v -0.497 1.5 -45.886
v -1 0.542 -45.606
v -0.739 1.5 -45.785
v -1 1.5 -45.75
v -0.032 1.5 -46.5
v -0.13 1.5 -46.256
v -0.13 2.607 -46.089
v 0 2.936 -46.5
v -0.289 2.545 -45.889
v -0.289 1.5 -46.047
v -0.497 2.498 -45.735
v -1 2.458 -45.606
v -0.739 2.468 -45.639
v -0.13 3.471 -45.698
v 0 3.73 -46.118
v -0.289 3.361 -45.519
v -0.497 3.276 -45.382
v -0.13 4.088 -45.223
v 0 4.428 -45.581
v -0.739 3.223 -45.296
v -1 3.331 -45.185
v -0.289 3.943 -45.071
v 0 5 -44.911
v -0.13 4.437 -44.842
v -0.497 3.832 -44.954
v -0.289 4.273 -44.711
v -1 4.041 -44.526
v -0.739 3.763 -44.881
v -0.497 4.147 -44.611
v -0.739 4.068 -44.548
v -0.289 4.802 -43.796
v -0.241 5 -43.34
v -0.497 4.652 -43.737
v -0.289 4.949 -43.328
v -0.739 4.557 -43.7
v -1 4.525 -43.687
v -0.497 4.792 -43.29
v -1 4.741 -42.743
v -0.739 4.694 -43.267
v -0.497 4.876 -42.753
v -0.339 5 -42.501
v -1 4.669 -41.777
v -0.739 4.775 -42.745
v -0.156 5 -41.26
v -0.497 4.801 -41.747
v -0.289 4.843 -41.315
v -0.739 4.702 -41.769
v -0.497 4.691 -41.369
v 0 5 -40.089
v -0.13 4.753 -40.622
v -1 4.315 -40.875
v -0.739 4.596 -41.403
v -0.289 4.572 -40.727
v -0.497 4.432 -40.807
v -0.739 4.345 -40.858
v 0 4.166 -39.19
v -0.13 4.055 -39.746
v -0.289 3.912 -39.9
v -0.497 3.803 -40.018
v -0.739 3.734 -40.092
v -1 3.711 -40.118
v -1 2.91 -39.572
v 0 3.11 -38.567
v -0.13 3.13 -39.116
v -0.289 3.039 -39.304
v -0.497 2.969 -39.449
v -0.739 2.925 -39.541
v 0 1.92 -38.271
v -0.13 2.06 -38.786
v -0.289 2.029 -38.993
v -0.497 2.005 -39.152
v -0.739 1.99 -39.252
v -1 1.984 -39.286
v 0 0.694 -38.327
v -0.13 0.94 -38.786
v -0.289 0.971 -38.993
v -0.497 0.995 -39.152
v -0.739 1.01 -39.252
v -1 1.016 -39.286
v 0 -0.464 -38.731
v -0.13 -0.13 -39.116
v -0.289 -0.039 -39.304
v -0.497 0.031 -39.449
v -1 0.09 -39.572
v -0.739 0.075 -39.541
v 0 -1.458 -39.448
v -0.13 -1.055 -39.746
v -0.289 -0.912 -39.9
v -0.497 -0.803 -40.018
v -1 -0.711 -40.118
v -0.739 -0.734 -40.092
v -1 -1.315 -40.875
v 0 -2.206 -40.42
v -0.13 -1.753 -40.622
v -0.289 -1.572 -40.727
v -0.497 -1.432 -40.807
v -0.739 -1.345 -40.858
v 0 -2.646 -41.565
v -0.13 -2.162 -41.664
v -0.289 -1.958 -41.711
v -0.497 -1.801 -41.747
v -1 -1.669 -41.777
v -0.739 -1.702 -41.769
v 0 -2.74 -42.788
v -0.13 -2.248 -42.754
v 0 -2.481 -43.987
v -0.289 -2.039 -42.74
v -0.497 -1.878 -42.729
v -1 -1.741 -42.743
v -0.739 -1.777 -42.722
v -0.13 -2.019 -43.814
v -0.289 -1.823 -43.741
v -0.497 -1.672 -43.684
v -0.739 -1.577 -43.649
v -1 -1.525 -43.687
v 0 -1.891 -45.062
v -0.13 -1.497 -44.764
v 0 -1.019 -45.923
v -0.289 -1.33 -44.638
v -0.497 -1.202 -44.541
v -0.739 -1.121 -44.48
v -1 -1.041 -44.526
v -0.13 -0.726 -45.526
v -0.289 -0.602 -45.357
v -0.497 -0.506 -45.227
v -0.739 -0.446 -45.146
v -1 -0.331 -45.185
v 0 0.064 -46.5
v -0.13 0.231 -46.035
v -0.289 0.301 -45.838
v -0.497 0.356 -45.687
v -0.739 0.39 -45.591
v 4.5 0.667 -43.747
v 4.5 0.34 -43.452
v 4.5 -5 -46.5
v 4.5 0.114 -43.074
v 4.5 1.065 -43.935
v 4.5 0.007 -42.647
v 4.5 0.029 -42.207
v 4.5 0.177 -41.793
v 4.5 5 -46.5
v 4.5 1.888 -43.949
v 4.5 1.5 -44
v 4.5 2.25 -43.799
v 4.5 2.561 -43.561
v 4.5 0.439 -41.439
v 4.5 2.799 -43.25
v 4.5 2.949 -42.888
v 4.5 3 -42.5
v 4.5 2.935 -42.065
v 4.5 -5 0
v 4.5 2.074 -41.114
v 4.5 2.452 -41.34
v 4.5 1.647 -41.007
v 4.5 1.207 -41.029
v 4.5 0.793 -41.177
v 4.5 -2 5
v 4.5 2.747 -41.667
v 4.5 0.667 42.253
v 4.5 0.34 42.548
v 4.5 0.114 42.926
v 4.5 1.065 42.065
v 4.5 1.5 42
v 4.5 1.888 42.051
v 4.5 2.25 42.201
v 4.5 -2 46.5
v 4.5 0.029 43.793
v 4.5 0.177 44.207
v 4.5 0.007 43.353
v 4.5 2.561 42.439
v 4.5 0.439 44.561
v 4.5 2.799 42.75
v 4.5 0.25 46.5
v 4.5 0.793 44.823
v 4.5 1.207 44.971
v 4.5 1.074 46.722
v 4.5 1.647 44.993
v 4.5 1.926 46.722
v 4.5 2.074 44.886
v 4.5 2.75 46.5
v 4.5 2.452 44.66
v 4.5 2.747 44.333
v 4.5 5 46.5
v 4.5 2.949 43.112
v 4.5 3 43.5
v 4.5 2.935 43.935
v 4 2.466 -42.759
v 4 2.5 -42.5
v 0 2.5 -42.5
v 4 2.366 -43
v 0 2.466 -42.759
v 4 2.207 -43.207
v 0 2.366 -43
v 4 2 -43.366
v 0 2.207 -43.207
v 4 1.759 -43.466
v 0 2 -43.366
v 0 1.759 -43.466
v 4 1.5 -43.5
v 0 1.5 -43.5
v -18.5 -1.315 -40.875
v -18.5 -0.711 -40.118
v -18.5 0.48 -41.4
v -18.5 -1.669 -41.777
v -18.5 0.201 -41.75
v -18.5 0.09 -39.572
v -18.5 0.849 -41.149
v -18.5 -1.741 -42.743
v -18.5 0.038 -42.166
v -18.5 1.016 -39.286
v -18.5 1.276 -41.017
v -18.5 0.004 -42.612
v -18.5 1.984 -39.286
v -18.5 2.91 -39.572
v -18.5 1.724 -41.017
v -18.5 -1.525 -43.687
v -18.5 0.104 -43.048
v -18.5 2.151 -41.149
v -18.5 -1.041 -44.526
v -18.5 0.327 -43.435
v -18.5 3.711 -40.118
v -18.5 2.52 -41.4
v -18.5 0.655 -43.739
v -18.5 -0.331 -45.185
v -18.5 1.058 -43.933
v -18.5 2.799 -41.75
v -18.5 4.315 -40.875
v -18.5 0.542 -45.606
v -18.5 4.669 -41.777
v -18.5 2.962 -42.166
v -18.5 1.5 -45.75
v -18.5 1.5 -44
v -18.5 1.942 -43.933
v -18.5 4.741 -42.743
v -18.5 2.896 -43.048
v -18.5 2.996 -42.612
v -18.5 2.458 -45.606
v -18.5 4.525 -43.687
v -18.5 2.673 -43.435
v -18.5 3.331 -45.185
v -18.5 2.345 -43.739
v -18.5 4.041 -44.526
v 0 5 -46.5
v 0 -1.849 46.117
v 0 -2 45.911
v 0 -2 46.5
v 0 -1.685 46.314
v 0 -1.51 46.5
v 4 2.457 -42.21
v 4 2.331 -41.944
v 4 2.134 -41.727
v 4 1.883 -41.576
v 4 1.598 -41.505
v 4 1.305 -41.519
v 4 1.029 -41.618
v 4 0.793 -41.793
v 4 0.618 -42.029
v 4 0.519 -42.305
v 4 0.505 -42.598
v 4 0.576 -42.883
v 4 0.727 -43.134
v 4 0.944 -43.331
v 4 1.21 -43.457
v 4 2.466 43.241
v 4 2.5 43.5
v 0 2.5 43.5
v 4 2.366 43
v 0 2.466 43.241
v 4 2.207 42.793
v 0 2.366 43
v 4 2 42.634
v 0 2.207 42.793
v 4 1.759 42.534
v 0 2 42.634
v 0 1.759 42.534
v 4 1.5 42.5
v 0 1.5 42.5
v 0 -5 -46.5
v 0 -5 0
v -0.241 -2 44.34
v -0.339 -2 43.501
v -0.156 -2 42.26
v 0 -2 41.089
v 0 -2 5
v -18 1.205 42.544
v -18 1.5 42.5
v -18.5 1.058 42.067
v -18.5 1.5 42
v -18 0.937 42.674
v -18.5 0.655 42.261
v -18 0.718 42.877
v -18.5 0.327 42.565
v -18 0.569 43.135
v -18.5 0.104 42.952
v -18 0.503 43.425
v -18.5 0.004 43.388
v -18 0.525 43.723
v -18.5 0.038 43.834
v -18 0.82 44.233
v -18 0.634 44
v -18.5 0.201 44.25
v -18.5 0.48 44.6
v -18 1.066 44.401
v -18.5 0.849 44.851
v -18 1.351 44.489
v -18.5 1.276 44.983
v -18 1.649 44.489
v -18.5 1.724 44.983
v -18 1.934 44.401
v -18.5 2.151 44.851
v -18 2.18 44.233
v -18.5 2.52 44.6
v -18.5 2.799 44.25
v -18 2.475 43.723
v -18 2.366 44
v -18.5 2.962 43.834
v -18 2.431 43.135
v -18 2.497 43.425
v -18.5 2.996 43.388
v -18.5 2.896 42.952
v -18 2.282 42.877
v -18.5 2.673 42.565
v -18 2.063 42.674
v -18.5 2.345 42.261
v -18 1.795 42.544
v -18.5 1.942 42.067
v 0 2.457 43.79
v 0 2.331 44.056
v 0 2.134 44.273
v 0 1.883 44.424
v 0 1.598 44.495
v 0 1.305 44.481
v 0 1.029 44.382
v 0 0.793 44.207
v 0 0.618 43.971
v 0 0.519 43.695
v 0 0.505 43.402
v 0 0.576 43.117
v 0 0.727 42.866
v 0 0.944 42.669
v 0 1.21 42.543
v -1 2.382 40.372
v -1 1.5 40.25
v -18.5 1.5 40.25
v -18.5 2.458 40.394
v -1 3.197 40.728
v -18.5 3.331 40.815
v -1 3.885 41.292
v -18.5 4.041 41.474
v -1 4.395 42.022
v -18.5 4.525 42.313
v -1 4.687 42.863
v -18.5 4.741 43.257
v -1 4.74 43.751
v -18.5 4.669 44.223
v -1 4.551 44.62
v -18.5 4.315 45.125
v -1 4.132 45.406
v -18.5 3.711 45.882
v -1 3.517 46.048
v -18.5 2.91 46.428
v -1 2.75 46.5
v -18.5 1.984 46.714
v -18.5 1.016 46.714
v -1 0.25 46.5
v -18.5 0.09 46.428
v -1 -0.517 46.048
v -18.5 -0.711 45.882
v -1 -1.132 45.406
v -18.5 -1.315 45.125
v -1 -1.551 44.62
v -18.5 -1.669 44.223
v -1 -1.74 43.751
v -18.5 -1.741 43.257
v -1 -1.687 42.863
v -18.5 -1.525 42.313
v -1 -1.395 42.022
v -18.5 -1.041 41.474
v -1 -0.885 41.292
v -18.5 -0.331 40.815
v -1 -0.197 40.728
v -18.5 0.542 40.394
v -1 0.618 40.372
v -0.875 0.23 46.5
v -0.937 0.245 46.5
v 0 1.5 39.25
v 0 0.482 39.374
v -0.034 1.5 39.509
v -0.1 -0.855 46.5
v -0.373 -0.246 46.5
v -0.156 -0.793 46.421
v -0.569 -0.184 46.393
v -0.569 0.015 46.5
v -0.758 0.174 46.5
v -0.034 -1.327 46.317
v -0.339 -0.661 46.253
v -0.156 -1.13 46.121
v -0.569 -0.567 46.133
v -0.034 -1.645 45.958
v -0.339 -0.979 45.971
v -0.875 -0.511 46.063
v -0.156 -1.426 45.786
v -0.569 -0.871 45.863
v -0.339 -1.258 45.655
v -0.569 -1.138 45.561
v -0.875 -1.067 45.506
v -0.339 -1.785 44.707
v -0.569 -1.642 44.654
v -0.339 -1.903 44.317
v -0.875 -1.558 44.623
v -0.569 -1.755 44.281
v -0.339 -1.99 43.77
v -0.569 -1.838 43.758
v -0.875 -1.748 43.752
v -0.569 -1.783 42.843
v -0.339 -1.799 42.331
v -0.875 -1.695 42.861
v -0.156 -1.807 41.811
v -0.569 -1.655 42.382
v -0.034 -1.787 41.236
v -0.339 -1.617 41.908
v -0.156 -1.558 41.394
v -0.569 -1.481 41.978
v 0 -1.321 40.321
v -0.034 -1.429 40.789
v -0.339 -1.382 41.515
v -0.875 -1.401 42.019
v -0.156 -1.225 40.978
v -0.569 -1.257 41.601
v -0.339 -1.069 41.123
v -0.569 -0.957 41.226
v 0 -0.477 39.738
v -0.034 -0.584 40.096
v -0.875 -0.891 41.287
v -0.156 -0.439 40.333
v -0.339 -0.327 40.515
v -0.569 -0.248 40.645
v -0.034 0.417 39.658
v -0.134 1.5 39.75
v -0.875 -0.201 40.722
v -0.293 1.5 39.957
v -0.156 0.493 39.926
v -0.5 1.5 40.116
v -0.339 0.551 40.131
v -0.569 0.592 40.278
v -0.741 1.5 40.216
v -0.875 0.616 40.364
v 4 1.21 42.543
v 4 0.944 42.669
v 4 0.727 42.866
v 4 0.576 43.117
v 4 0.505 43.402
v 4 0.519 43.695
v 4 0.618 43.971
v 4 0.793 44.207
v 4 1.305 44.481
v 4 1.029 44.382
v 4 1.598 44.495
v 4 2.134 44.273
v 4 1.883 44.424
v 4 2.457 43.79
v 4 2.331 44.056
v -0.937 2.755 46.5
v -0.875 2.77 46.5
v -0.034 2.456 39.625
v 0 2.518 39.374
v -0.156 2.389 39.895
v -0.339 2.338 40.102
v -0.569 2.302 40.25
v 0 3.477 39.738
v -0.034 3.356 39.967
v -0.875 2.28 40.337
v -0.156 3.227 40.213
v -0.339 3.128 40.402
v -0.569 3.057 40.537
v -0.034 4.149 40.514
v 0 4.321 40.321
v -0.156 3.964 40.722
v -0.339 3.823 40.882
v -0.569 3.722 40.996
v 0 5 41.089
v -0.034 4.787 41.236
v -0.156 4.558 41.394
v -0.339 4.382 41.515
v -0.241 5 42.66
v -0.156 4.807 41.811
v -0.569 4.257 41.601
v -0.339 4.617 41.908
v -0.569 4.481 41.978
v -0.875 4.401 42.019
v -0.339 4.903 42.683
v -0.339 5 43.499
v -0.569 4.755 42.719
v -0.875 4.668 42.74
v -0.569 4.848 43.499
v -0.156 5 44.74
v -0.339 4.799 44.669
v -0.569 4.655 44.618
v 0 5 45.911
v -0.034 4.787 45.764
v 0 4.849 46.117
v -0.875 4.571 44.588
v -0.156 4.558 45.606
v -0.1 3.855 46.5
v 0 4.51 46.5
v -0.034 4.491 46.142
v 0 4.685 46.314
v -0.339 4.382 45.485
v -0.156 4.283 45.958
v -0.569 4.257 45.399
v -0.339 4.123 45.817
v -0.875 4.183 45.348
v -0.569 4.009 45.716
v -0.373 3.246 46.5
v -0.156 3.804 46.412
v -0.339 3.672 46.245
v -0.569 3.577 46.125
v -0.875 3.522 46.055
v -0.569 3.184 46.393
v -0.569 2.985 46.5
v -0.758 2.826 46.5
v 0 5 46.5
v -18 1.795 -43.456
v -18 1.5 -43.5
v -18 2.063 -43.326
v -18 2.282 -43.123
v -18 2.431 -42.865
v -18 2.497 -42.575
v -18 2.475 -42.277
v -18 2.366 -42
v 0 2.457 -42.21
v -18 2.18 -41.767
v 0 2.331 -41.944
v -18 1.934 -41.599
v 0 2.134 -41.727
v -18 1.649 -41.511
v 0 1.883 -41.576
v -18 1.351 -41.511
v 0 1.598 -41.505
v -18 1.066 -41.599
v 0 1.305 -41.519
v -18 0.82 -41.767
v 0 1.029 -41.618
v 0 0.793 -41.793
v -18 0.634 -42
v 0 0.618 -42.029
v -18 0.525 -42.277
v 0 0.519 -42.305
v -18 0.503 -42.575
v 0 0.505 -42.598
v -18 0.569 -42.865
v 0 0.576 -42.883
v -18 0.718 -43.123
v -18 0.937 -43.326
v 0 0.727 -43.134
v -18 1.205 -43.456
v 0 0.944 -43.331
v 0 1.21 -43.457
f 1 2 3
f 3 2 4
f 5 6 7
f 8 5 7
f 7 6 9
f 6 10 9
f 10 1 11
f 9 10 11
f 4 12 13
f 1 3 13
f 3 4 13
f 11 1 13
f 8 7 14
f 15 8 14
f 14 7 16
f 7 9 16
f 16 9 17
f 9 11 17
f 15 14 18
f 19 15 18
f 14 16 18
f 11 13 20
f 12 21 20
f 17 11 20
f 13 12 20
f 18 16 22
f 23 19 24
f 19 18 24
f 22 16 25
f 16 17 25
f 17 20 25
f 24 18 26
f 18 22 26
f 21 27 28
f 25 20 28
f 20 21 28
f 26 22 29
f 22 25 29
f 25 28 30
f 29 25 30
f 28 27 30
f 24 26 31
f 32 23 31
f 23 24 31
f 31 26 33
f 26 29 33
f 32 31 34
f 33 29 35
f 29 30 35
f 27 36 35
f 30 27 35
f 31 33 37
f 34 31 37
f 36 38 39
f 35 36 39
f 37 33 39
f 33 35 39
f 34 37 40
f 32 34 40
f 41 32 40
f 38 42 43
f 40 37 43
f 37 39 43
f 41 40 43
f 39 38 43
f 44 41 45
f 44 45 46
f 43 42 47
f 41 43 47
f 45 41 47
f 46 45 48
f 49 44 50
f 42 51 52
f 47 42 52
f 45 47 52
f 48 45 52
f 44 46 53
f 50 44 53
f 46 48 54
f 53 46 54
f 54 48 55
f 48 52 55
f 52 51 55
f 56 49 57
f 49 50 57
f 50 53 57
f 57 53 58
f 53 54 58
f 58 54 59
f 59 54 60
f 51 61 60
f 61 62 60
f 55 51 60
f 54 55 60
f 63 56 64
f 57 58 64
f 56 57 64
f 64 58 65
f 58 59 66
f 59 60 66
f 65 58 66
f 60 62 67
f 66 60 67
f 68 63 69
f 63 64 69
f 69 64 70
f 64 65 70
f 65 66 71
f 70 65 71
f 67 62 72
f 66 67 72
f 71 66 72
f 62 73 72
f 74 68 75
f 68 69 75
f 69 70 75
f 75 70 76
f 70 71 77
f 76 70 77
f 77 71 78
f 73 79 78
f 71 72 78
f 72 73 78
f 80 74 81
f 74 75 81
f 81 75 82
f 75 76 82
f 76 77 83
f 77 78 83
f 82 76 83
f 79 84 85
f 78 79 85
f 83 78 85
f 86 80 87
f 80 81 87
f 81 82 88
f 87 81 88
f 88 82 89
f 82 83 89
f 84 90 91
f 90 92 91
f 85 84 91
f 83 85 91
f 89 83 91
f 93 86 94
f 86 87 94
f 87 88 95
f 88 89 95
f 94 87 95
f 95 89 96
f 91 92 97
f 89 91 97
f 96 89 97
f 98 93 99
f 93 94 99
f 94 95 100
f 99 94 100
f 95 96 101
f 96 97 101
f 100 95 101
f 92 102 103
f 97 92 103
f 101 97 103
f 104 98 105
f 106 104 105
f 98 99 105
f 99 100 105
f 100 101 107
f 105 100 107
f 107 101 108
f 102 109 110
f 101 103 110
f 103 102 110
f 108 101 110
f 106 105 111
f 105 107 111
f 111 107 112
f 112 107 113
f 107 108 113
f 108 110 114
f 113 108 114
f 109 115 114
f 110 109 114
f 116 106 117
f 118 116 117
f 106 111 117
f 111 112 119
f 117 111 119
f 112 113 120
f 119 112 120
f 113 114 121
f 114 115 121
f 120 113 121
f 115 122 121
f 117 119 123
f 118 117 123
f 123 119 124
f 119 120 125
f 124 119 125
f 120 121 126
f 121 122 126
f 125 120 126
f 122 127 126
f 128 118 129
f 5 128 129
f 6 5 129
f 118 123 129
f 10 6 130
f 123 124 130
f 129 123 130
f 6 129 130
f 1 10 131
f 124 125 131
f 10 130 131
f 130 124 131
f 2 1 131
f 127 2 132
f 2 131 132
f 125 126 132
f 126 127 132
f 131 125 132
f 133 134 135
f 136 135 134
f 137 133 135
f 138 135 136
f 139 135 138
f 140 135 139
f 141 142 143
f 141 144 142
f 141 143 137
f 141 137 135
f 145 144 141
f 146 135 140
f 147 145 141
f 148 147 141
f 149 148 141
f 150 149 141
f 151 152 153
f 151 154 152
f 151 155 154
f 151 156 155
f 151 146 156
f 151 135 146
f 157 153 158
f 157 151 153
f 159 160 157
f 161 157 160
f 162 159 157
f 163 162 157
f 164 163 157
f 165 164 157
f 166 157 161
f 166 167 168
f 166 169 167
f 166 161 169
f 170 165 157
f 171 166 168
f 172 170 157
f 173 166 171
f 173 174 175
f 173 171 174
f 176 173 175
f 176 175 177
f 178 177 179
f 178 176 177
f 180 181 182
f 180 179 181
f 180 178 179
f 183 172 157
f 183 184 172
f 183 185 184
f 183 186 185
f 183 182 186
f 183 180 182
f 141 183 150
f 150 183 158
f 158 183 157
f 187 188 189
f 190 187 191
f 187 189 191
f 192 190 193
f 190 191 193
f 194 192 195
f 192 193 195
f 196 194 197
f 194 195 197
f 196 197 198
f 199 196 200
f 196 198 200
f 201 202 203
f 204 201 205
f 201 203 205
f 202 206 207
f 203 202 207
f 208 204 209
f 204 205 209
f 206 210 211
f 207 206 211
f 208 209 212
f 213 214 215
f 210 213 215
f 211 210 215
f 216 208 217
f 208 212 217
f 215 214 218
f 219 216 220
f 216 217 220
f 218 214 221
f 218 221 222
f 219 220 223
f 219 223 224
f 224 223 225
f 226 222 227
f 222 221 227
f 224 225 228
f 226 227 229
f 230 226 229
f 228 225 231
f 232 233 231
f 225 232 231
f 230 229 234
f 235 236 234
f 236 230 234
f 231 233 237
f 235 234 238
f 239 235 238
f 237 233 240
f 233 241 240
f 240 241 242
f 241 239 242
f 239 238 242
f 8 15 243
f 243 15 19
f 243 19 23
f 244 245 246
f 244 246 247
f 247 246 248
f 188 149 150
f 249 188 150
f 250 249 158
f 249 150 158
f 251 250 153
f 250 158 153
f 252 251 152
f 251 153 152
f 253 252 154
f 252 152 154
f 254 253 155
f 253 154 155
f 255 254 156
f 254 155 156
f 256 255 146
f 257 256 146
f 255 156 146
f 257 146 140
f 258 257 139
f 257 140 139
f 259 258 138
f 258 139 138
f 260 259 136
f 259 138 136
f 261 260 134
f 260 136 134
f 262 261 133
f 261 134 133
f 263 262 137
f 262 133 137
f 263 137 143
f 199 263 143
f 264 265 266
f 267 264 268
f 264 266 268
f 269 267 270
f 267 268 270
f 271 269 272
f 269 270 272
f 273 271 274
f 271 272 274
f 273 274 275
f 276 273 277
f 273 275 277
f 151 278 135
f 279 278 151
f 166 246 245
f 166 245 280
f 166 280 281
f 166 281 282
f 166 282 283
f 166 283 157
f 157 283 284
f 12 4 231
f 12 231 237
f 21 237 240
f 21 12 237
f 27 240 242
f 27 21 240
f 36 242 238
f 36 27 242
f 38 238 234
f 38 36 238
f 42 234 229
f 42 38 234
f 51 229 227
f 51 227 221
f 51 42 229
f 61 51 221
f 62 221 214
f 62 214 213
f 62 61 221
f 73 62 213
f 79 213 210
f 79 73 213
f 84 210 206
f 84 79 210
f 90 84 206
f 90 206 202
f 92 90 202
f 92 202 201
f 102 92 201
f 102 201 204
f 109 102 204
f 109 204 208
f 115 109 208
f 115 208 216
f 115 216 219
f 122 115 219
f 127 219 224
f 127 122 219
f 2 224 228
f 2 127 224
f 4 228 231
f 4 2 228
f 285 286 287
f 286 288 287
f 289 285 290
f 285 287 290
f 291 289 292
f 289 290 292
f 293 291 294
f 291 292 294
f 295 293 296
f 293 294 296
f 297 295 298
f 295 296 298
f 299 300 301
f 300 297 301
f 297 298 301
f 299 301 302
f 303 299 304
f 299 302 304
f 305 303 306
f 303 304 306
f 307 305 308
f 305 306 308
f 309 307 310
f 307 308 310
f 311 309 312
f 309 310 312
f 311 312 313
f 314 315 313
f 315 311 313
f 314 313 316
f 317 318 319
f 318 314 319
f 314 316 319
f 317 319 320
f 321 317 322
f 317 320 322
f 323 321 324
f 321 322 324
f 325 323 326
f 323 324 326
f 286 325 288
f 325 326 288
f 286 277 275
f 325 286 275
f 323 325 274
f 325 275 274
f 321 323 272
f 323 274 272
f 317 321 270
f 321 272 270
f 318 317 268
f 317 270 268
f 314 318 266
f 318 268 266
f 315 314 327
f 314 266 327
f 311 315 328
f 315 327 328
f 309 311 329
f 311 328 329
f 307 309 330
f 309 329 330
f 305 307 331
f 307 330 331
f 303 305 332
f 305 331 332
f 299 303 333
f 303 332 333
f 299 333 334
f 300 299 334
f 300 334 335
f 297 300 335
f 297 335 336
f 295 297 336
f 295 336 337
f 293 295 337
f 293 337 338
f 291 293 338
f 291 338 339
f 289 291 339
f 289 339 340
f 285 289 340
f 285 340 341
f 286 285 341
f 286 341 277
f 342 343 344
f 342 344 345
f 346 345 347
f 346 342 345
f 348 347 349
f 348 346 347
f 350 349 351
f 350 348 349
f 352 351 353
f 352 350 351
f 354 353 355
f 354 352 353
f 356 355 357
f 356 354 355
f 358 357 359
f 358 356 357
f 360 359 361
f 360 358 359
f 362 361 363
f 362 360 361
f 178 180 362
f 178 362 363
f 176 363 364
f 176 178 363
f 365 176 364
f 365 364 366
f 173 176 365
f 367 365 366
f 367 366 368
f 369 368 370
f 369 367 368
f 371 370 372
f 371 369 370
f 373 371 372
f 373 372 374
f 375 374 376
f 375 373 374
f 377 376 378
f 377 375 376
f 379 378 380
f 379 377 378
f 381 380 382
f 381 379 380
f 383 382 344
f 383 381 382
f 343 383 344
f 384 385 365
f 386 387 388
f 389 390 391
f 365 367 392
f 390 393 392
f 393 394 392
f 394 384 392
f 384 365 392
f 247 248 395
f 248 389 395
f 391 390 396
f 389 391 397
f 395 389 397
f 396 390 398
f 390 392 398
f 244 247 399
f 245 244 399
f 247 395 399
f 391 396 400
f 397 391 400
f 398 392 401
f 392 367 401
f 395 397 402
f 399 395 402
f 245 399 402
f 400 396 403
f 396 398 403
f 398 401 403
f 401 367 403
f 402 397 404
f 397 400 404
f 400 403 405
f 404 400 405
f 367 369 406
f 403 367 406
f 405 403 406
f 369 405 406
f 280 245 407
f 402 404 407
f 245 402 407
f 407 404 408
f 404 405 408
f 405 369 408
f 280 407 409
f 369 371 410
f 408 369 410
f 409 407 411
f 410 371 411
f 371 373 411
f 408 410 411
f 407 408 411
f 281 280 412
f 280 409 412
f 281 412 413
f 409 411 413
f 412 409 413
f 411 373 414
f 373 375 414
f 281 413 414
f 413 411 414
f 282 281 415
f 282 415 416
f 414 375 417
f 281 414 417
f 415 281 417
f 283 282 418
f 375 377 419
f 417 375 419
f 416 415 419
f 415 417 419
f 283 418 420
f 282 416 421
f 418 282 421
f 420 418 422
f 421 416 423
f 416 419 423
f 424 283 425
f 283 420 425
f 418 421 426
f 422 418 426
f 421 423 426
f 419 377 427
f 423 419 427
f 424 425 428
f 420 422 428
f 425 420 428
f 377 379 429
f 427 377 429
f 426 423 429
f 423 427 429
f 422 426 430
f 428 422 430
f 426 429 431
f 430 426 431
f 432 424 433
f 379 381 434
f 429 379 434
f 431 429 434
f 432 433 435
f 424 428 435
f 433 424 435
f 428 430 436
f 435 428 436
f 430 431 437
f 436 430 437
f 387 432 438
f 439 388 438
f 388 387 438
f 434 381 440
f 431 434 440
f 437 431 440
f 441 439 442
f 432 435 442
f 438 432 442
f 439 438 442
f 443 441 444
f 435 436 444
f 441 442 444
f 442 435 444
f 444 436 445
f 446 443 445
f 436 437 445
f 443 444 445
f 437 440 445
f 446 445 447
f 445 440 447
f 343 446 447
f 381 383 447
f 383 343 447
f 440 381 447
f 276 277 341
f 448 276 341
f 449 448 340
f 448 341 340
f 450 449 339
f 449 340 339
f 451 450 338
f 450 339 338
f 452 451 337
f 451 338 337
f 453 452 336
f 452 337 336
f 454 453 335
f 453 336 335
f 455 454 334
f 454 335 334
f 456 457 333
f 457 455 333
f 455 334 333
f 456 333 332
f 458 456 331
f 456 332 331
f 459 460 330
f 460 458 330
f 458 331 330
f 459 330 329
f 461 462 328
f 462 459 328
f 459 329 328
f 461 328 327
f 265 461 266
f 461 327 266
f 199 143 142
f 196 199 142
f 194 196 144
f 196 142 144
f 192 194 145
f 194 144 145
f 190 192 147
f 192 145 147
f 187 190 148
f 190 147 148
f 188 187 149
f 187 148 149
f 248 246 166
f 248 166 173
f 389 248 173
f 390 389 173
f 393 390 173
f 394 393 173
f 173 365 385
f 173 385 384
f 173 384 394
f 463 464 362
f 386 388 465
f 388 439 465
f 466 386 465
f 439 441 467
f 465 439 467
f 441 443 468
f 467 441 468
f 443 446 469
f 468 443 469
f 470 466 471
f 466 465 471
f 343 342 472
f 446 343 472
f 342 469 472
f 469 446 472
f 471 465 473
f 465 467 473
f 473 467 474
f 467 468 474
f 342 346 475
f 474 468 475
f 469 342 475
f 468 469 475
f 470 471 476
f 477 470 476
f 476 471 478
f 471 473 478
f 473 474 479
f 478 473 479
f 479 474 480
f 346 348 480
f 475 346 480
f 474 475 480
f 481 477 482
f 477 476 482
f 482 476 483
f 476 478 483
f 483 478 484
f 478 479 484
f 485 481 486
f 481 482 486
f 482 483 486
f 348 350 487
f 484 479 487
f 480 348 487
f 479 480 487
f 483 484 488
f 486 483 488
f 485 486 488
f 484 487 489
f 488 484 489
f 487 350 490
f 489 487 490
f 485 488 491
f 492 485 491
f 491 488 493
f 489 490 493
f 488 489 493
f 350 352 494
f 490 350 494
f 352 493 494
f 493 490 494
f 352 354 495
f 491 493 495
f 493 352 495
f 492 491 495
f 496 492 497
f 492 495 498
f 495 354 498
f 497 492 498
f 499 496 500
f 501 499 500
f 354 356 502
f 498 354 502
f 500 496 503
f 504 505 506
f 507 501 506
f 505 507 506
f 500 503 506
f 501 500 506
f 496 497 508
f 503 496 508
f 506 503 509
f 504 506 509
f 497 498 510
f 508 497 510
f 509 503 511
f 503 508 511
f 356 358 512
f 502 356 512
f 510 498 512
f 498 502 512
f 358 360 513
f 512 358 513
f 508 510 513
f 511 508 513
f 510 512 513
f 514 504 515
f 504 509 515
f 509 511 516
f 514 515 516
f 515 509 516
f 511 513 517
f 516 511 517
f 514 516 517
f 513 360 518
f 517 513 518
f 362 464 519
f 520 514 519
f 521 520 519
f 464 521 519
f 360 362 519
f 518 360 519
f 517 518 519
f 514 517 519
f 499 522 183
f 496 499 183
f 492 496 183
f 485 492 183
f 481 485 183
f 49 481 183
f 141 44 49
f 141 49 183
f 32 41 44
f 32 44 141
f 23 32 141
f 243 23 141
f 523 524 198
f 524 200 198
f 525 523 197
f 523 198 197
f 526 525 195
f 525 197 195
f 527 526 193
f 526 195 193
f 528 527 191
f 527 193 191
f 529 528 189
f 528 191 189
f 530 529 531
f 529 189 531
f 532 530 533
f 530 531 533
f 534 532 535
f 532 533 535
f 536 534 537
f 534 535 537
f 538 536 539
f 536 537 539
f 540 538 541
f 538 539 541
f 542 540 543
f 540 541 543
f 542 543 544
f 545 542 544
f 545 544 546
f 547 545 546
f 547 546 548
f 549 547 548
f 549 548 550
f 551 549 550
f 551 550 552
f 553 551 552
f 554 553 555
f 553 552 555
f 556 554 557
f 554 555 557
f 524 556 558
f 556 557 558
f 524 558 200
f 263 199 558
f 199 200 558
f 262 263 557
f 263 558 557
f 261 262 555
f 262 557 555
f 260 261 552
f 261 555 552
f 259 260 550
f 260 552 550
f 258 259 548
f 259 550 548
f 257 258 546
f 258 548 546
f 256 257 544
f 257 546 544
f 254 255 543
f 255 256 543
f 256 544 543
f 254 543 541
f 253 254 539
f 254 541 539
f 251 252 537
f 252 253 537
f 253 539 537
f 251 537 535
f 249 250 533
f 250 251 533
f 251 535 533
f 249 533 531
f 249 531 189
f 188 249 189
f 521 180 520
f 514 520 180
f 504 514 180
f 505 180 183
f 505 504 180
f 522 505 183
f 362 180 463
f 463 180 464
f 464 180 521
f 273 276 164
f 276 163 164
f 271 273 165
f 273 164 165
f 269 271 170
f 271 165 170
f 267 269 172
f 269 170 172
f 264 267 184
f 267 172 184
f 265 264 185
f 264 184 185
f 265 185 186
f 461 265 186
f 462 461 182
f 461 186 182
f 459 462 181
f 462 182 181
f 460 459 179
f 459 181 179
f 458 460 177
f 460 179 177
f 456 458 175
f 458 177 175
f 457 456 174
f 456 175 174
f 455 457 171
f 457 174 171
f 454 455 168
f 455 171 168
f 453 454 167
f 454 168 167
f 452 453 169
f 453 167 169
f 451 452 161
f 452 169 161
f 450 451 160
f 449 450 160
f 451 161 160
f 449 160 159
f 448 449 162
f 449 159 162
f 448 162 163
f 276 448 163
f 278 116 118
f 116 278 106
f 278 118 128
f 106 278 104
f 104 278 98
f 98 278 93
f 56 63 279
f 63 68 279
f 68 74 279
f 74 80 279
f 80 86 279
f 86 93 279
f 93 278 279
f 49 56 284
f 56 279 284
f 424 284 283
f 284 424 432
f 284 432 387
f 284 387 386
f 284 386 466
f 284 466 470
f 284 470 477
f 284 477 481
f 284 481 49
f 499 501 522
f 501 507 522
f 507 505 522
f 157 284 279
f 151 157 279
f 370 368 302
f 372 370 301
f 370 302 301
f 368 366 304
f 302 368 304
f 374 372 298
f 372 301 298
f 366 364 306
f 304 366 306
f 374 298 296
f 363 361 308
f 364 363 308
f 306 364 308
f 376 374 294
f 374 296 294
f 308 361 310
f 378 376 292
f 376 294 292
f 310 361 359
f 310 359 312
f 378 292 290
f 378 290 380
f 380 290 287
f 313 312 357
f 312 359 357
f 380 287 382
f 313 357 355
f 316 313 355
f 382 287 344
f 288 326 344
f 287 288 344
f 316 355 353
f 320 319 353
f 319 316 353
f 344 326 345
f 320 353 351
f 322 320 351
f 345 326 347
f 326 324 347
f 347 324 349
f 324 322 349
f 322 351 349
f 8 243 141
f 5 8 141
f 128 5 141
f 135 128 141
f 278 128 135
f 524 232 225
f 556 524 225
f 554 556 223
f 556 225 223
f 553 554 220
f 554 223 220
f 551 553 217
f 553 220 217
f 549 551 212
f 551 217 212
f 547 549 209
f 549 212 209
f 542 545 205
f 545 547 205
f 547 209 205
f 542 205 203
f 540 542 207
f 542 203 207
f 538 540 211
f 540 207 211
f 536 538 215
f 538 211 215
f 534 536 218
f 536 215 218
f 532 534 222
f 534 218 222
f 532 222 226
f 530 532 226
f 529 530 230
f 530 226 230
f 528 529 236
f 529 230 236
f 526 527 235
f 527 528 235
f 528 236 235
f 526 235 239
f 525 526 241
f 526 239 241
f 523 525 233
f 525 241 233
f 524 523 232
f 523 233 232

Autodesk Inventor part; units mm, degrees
ref_plane "YZ Plane" through (0, 0, 0) normal (1, 0, 0) x (0, 1, 0)
ref_plane "XZ Plane" through (0, 0, 0) normal (0, 1, 0) x (-1, 0, 0)
ref_plane "XY Plane" through (0, 0, 0) normal (0, 0, 1) x (1, 0, 0)
sketch "Sketch1" plane through (0, 0, 0) normal (1, 0, 0) x (0, 1, 0)
  line L0 (5, -46.5) -> (-5, -46.5)
  line L1 (-5, -46.5) -> (-5, 46.5)
  line L2 (-5, 46.5) -> (5, 46.5)
  line L3 (5, 46.5) -> (5, -46.5)
  line L4 (5, -46.5) -> (-5, 46.5) construction
  line L5 (-5, -46.5) -> (5, 46.5) construction
  circle A0 centre (1.5, 43.5) radius 1
  circle A1 centre (1.5, -42.5) radius 1
  line L6 (-2, 46.5) -> (-2, 5)
  line L7 (-2, 5) -> (-5, 0)
  point P0 (0, 0)
  dimension "d0" = 2
  dimension "d2" = 86
  dimension "d3" = 93
  dimension "d4" = 3.5
  dimension "d5" = 6.5
  dimension "d6" = 4
  dimension "d20" = 3.5
  dimension "d21" = 5
extrude "Extrusion1" add sketch "Sketch1" along normal blind 4.5 contours L0 L1 L7 L6 L2 L3
sketch "Sketch2" plane through (4.5, 0, 0) normal (1, 0, 0) x (0, 0, -1)
  circle A0 centre (-43.5, 1.5) radius 1 projected
  circle A1 centre (-43.5, 1.5) radius 3.25
  circle A2 centre (42.5, 1.5) radius 1 projected
  circle A3 centre (42.5, 1.5) radius 3.25
  point P0 (0, 0)
  dimension "d9" = 6.5
extrude "Extrusion2" add sketch "Sketch2" against normal blind 23
fillet "Fillet1" radius 1 3 edges at (0, -1.6869, 42.8626) (0, 4.6869, 42.8626) (0, 1.5, -39.25)
chamfer "Chamfer1" distance 0.5 angle 45 6 edges at (4.5, 0.7929, 44.2071) (4.5, 2.2071, 42.7929) (4.5, 2.2071, -43.2071) (4.5, 0.7929, -41.7929) (-18.5, 1.5, -41.5) (-18.5, 1.5, 44.5)
properties part number "PCB_support"
